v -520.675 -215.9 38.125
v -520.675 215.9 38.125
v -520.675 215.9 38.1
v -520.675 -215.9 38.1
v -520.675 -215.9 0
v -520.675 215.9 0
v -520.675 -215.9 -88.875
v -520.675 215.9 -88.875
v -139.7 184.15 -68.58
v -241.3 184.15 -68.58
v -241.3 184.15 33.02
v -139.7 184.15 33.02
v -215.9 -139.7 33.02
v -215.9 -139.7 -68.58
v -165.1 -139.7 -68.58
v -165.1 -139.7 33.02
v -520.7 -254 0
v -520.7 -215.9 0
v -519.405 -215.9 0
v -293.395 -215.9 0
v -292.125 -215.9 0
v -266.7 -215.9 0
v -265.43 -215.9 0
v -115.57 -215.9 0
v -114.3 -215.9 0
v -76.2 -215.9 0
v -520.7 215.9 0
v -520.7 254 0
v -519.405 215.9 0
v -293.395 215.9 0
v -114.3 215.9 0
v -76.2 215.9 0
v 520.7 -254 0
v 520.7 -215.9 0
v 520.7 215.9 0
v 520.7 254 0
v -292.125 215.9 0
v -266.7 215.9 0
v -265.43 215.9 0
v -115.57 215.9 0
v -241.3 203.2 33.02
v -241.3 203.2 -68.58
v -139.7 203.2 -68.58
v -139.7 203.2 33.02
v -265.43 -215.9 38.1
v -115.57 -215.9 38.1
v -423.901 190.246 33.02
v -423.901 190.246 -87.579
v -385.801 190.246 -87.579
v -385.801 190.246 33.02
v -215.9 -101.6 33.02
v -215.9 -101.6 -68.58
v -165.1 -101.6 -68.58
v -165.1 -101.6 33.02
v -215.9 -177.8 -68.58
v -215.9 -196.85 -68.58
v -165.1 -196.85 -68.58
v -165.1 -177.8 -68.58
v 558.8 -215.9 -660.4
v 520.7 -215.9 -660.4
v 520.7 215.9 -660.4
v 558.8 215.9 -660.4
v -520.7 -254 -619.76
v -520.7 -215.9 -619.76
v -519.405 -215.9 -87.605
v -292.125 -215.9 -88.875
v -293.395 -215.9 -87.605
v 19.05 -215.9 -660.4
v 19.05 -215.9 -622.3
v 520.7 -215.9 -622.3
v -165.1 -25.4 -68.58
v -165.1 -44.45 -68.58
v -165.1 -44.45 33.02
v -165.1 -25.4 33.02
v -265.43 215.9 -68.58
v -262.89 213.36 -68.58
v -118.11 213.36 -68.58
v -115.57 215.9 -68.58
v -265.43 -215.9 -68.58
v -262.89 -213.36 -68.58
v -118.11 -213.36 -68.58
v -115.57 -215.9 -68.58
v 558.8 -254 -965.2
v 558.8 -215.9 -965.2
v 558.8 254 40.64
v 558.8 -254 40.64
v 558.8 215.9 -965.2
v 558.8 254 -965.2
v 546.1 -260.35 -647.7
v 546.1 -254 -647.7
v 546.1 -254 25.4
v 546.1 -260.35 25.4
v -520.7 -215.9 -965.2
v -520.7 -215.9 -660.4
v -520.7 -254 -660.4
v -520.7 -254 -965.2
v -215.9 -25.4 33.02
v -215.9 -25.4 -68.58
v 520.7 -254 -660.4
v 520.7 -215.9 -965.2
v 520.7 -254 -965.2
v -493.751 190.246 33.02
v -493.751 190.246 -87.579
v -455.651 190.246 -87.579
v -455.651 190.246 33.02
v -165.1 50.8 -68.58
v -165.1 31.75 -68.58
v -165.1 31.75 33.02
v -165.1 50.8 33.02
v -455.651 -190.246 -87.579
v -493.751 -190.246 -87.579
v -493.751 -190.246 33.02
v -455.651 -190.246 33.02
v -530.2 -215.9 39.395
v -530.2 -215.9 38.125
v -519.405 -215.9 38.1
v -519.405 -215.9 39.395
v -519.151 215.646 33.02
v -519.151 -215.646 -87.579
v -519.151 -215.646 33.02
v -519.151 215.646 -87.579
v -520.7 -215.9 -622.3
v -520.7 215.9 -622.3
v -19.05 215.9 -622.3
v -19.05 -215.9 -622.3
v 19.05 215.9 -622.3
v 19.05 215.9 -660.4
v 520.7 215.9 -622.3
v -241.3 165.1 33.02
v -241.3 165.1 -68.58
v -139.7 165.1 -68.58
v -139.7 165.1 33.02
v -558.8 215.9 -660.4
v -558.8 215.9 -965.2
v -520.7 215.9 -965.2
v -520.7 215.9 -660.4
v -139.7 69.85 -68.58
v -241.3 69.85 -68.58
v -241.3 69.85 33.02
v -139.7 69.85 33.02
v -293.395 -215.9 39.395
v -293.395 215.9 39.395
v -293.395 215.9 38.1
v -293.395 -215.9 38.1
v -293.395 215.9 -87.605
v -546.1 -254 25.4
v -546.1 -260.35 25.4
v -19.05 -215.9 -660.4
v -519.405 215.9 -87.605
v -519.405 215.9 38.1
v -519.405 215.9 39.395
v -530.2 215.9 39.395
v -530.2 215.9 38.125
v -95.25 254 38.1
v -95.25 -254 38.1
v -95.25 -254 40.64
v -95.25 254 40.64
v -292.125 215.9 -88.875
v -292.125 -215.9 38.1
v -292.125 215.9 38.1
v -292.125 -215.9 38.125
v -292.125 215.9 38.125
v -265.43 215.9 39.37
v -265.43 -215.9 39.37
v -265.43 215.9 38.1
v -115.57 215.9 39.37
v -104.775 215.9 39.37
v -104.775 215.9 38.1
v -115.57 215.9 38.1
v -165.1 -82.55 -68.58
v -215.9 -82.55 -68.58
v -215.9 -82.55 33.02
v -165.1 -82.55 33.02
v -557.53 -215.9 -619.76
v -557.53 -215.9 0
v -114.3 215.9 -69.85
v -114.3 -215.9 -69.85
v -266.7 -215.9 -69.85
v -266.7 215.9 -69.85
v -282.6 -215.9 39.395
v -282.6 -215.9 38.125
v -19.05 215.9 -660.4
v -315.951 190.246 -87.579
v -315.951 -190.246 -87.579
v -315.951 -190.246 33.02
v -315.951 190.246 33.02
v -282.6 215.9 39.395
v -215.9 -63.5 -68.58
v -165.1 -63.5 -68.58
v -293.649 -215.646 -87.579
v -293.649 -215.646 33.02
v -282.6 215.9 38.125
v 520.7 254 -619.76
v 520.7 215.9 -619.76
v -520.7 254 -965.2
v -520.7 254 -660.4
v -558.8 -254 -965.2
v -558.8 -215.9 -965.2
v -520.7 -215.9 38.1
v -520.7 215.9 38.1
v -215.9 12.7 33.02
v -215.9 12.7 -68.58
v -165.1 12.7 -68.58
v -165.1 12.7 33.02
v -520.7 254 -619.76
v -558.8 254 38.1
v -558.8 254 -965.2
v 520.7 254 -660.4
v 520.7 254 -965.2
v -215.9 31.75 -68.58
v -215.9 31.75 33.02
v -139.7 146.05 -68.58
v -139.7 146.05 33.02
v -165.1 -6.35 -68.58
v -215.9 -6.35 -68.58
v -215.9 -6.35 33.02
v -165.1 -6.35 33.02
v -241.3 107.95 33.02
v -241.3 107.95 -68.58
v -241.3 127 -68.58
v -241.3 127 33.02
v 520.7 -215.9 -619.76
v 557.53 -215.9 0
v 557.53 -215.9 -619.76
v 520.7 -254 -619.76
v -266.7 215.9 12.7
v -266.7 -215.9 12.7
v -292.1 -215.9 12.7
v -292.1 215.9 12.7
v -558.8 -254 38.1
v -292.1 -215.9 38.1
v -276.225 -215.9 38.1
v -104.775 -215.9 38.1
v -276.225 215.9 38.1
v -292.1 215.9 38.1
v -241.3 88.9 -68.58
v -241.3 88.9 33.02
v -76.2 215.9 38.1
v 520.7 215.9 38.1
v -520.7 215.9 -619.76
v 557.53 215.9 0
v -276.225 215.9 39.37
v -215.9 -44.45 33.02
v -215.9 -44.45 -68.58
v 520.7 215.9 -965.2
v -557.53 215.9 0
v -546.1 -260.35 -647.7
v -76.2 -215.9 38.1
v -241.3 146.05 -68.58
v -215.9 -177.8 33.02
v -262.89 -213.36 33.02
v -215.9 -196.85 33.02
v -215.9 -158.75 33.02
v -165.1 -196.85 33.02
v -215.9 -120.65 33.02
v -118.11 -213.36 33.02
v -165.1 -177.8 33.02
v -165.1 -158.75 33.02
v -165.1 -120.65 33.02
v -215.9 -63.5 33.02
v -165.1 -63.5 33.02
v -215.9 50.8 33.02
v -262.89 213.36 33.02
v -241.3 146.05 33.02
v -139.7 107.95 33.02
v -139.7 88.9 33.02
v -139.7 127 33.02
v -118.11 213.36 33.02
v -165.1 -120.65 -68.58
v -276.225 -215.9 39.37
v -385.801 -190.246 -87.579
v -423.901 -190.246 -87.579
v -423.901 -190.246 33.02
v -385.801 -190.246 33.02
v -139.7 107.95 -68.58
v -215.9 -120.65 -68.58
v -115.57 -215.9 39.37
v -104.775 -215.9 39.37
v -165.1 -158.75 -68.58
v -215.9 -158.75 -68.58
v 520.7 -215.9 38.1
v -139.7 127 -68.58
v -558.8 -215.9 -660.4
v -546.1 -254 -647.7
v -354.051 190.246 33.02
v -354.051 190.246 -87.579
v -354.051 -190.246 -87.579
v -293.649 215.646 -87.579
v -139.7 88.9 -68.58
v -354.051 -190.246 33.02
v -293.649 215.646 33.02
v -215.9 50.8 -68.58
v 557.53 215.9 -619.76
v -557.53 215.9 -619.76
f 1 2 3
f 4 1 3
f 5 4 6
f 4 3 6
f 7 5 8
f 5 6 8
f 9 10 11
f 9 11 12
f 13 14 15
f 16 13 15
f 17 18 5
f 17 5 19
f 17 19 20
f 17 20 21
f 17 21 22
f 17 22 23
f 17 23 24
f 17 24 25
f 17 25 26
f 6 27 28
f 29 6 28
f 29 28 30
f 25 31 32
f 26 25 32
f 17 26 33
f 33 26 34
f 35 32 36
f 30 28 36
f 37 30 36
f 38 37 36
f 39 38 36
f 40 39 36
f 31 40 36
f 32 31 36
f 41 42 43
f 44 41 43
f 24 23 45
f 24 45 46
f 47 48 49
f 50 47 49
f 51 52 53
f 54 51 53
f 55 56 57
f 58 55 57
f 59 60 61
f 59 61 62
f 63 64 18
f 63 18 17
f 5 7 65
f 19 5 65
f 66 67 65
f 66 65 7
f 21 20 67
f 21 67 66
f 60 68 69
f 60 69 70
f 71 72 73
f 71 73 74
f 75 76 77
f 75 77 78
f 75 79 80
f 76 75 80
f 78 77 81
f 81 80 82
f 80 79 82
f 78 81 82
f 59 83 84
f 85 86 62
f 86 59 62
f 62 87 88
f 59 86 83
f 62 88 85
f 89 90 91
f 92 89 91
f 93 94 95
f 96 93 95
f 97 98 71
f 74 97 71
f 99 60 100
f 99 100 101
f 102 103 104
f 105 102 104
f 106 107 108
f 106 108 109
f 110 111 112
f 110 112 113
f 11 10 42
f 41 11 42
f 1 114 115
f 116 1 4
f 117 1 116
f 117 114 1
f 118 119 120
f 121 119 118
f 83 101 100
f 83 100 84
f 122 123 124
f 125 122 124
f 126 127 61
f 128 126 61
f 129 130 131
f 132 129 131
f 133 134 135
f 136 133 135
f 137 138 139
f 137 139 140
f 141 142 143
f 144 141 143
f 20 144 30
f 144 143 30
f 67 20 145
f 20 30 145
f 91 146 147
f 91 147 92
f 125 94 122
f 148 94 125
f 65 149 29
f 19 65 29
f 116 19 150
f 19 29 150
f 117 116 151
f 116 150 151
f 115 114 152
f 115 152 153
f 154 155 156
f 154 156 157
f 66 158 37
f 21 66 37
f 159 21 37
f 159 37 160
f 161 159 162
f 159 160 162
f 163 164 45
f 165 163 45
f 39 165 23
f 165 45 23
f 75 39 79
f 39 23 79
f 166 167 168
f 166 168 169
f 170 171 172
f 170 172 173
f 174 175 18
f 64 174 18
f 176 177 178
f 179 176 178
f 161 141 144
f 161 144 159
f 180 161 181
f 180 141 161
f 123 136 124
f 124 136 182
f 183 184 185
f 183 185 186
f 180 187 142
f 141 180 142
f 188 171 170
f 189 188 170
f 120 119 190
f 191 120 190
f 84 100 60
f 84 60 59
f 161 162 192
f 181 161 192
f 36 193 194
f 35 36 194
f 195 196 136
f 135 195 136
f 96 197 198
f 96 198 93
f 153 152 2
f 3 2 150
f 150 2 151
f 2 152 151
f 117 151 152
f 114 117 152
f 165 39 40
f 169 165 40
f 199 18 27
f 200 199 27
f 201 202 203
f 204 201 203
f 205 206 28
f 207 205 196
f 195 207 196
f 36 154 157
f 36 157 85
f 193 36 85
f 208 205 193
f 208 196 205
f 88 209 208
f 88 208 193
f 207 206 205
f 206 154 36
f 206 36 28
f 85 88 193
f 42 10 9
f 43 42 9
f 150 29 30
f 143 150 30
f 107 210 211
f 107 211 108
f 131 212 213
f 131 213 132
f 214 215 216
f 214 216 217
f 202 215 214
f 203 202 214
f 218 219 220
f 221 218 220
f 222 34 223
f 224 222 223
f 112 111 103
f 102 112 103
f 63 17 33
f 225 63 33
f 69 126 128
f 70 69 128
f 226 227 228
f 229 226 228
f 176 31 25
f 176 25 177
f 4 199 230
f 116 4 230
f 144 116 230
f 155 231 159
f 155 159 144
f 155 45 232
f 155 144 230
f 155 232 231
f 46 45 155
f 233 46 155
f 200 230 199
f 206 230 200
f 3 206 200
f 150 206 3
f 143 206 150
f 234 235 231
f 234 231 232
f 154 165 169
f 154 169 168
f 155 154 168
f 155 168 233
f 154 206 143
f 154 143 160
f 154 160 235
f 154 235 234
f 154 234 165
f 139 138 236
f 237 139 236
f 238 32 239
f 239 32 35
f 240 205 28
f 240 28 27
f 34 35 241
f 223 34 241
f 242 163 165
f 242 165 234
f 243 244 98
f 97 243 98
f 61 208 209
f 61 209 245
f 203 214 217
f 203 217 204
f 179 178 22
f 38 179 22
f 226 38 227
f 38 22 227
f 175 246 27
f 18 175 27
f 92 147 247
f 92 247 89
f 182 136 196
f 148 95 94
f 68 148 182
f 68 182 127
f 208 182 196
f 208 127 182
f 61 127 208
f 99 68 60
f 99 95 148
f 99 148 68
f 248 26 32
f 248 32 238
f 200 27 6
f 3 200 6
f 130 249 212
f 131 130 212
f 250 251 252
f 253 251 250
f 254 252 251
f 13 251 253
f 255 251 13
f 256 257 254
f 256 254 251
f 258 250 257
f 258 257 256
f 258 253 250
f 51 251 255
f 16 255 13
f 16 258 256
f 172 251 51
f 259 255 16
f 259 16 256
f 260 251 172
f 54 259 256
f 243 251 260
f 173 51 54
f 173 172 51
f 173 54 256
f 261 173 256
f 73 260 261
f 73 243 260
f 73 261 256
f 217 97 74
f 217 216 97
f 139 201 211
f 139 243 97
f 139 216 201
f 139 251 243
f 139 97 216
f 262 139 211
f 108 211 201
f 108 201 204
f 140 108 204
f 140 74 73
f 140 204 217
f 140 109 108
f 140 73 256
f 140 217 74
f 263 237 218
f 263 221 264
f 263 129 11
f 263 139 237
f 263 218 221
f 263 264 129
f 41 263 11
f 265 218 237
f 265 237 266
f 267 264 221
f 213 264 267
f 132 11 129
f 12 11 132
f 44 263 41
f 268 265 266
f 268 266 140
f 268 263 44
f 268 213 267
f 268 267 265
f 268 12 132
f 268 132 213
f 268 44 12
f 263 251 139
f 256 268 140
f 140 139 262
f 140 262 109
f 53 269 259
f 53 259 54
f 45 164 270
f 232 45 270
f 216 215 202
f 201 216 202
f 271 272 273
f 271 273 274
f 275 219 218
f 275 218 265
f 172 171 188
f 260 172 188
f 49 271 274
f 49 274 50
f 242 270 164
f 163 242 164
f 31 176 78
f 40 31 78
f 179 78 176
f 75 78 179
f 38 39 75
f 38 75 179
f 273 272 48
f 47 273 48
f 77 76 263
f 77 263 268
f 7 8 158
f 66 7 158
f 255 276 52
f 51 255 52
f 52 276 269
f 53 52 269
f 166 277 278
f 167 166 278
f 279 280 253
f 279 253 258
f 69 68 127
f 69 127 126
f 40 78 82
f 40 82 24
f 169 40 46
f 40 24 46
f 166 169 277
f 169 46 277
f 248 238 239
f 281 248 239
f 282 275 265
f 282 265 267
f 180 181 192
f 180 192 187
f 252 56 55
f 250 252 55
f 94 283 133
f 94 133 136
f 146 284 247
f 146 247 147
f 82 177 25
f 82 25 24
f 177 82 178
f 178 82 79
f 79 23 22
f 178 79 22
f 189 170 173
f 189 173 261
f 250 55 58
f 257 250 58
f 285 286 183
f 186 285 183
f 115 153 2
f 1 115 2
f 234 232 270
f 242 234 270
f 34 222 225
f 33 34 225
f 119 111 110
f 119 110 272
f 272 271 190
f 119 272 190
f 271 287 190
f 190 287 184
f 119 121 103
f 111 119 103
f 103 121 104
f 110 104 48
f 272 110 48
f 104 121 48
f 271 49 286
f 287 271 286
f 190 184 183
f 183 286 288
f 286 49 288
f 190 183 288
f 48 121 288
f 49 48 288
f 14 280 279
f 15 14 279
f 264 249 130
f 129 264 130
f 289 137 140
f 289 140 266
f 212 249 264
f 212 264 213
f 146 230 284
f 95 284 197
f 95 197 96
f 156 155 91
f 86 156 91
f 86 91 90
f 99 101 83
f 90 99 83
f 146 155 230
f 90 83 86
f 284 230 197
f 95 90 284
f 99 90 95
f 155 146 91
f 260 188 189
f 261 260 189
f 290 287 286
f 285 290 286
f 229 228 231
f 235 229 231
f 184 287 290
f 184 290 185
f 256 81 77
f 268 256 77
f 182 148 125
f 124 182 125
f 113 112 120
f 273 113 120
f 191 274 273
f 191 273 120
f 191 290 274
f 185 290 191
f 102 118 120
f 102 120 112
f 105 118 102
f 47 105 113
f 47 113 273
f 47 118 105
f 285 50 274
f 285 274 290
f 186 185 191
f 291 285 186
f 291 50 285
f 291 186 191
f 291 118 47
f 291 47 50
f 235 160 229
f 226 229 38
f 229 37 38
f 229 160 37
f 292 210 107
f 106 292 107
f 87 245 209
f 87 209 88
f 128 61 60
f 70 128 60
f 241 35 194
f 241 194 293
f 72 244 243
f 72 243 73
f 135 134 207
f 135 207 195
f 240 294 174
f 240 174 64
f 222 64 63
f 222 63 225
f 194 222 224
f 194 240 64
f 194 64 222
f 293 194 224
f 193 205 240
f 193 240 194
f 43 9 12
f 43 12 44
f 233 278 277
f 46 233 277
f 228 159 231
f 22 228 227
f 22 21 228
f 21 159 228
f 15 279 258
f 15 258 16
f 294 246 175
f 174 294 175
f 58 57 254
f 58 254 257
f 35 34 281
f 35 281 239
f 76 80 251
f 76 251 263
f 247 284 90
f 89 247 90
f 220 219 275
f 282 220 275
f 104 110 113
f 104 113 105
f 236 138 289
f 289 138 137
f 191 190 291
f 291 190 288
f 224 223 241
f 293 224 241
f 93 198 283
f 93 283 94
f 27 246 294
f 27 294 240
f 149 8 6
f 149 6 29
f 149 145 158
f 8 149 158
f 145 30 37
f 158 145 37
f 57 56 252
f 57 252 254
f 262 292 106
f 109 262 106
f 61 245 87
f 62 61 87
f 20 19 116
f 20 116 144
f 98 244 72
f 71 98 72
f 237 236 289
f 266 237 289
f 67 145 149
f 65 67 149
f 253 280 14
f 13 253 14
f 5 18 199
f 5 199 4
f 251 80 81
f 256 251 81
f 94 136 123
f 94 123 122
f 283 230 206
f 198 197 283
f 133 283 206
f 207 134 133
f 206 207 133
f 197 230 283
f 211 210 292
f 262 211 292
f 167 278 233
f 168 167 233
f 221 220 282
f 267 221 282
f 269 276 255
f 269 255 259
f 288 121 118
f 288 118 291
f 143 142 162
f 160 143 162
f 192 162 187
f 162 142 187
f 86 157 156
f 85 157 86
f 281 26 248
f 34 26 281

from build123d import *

# Parameters (mm, degrees)
F0_W      = 1117.6
F0_H      = 508
F0_W_2    = 1041.4
F0_H_2    = 431.8
F1_DEPTH  = 38.1
F2_W      = 38.1
F2_H      = 38.1
F3_DEPTH  = 965.2
F5_W      = 1117.6
F5_H      = 508
F5_W_2    = 1041.4
F5_H_2    = 431.8
F6_DEPTH  = 38.1
F7_W      = 431.8
F7_H      = 622.3
F8_DEPTH  = 1.27
F9_W      = 431.8
F9_H      = 622.3
F10_DEPTH = 1.27
F11_W     = 38.1
F11_H     = 38.1
F11_W_2   = 25.4
F11_H_2   = 25.4
F12_DEPTH = 431.8
F13_W     = 654.05
F13_H     = 508
F14_DEPTH = 2.54
F16_DEPTH = 431.8
F17_W     = 144.78
F17_H     = 426.72
F17_W_2   = 50.8
F17_H_2   = 19.05
F17_W_3   = 101.6
F18_DEPTH = 101.6
F19_W     = 1117.6
F19_H     = 508
F20_DEPTH = 2.54
F21_W     = 38.1
F21_H     = 38.1
F22_DEPTH = 431.8
F23_W     = 1092.2
F23_H     = 673.1
F24_DEPTH = 6.35
F27_DEPTH = 431.8
F29_W     = 225.5012
F29_H     = 431.292
F29_W_2   = 38.1
F29_H_2   = 380.492
F30_DEPTH = 120.5992


with BuildPart() as f1:
    # F0 (on Top) → F1 (new body)
    with BuildSketch(Plane.XY):
        Rectangle(F0_W, F0_H)
        Rectangle(F0_W_2, F0_H_2, mode=Mode.SUBTRACT)
    extrude(amount=F1_DEPTH)

    # F2 (on face) → F3 (join)
    with BuildSketch(Plane(origin=(0, 0, 0), x_dir=(1, 0, 0), z_dir=(0, 0, -1))):
        with Locations((-539.75, 234.95)):
            Rectangle(F2_W, F2_H)
        with Locations((539.75, 234.95)):
            Rectangle(F2_W, F2_H)
        with Locations((539.75, -234.95)):
            Rectangle(F2_W, F2_H)
        with Locations((-539.75, -234.95)):
            Rectangle(F2_W, F2_H)
    extrude(amount=F3_DEPTH)

    # F5 (on offset) → F6 (join)
    with BuildSketch(Plane(origin=(0, 0, -660.4), x_dir=(1, 0, 0), z_dir=(0, 0, -1))):
        Rectangle(F5_W, F5_H)
        Rectangle(F5_W_2, F5_H_2, mode=Mode.SUBTRACT)
    extrude(amount=-F6_DEPTH)

    # F7 (on face) → F8 (join)
    with BuildSketch(Plane(origin=(-558.8, 0, 0), x_dir=(0, -1, 0), z_dir=(-1, 0, 0))):
        with Locations((0, -311.15)):
            Rectangle(F7_W, F7_H)
    extrude(amount=-F8_DEPTH)

    # F9 (on face) → F10 (join)
    with BuildSketch(Plane.YZ.offset(558.8)):
        with Locations((0, -311.15)):
            Rectangle(F9_W, F9_H)
    extrude(amount=-F10_DEPTH)

    # F11 (on face) → F12 (join, through all)
    with BuildSketch(Plane(origin=(0, -215.9, 0), x_dir=(-1, 0, 0), z_dir=(0, 1, 0))):
        with Locations((95.25, 19.05)):
            Rectangle(F11_W, F11_H)
        with Locations((279.4, 25.4)):
            Rectangle(F11_W_2, F11_H_2)
    extrude(amount=F12_DEPTH)

    # F13 (on face) → F14 (join)
    with BuildSketch(Plane.XY.offset(38.1)):
        with Locations((231.775, 0)):
            Rectangle(F13_W, F13_H)
    extrude(amount=F14_DEPTH)

    # F15 (on face) → F16 (join, through all)
    with BuildSketch(Plane(origin=(0, -215.9, 0), x_dir=(-1, 0, 0), z_dir=(0, 1, 0))):
        Polygon((104.775, 39.37), (104.775, 38.1), (114.3, 38.1), (114.3, -69.85), (266.7, -69.85), (266.7, 38.1), (276.225, 38.1), (276.225, 39.37), (265.43, 39.37), (265.43, -68.58), (115.57, -68.58), (115.57, 39.37), align=None)
    extrude(amount=F16_DEPTH)

    # F17 (on face) → F18 (join)
    with BuildSketch(Plane.XY.offset(-68.58)):
        with Locations((-190.5, 0)):
            Rectangle(F17_W, F17_H)
        with Locations((-190.5, -187.325)):
            Rectangle(F17_W_2, F17_H_2, mode=Mode.SUBTRACT)
        with Locations((-190.5, -149.225)):
            Rectangle(F17_W_2, F17_H_2, mode=Mode.SUBTRACT)
        with Locations((-190.5, -111.125)):
            Rectangle(F17_W_2, F17_H_2, mode=Mode.SUBTRACT)
        with Locations((-190.5, -73.025)):
            Rectangle(F17_W_2, F17_H_2, mode=Mode.SUBTRACT)
        with Locations((-190.5, -34.925)):
            Rectangle(F17_W_2, F17_H_2, mode=Mode.SUBTRACT)
        with Locations((-190.5, 3.175)):
            Rectangle(F17_W_2, F17_H_2, mode=Mode.SUBTRACT)
        with Locations((-190.5, 41.275)):
            Rectangle(F17_W_2, F17_H_2, mode=Mode.SUBTRACT)
        with Locations((-190.5, 79.375)):
            Rectangle(F17_W_3, F17_H_2, mode=Mode.SUBTRACT)
        with Locations((-190.5, 117.475)):
            Rectangle(F17_W_3, F17_H_2, mode=Mode.SUBTRACT)
        with Locations((-190.5, 155.575)):
            Rectangle(F17_W_3, F17_H_2, mode=Mode.SUBTRACT)
        with Locations((-190.5, 193.675)):
            Rectangle(F17_W_3, F17_H_2, mode=Mode.SUBTRACT)
    extrude(amount=F18_DEPTH)

    # F19 (on face) → F20 (join)
    with BuildSketch(Plane.XY.offset(-622.3)):
        Rectangle(F19_W, F19_H)
    extrude(amount=F20_DEPTH)

    # F21 (on face) → F22 (join, through all)
    with BuildSketch(Plane.XZ.offset(-215.9)):
        with Locations((0, -641.35)):
            Rectangle(F21_W, F21_H)
    extrude(amount=F22_DEPTH)

    # F23 (on face) → F24 (join)
    with BuildSketch(Plane.XZ.offset(254)):
        with Locations((0, -311.15)):
            Rectangle(F23_W, F23_H)
    extrude(amount=F24_DEPTH)

    # F26 (on face) → F27 (join, through all)
    with BuildSketch(Plane.XZ.offset(-215.9)):
        Polygon((-530.1996, 39.3954), (-530.1996, 38.1254), (-520.6746, 38.1254), (-520.6746, -88.8746), (-292.1254, -88.8746), (-292.1254, 38.1254), (-282.6004, 38.1254), (-282.6004, 39.3954), (-293.3954, 39.3954), (-293.3954, -87.6046), (-519.4046, -87.6046), (-519.4046, 39.3954), align=None)
    extrude(amount=F27_DEPTH)


with BuildPart() as f30:
    # F29 (on offset) → F30 (new body, through all)
    with BuildSketch(Plane.XY.offset(-87.5792)):
        with Locations((-406.4, 0)):
            Rectangle(F29_W, F29_H)
        with Locations((-474.7006, 0)):
            Rectangle(F29_W_2, F29_H_2, mode=Mode.SUBTRACT)
        with Locations((-404.8506, 0)):
            Rectangle(F29_W_2, F29_H_2, mode=Mode.SUBTRACT)
        with Locations((-335.0006, 0)):
            Rectangle(F29_W_2, F29_H_2, mode=Mode.SUBTRACT)
    extrude(amount=F30_DEPTH)


solid = Compound([f1.part, f30.part])
